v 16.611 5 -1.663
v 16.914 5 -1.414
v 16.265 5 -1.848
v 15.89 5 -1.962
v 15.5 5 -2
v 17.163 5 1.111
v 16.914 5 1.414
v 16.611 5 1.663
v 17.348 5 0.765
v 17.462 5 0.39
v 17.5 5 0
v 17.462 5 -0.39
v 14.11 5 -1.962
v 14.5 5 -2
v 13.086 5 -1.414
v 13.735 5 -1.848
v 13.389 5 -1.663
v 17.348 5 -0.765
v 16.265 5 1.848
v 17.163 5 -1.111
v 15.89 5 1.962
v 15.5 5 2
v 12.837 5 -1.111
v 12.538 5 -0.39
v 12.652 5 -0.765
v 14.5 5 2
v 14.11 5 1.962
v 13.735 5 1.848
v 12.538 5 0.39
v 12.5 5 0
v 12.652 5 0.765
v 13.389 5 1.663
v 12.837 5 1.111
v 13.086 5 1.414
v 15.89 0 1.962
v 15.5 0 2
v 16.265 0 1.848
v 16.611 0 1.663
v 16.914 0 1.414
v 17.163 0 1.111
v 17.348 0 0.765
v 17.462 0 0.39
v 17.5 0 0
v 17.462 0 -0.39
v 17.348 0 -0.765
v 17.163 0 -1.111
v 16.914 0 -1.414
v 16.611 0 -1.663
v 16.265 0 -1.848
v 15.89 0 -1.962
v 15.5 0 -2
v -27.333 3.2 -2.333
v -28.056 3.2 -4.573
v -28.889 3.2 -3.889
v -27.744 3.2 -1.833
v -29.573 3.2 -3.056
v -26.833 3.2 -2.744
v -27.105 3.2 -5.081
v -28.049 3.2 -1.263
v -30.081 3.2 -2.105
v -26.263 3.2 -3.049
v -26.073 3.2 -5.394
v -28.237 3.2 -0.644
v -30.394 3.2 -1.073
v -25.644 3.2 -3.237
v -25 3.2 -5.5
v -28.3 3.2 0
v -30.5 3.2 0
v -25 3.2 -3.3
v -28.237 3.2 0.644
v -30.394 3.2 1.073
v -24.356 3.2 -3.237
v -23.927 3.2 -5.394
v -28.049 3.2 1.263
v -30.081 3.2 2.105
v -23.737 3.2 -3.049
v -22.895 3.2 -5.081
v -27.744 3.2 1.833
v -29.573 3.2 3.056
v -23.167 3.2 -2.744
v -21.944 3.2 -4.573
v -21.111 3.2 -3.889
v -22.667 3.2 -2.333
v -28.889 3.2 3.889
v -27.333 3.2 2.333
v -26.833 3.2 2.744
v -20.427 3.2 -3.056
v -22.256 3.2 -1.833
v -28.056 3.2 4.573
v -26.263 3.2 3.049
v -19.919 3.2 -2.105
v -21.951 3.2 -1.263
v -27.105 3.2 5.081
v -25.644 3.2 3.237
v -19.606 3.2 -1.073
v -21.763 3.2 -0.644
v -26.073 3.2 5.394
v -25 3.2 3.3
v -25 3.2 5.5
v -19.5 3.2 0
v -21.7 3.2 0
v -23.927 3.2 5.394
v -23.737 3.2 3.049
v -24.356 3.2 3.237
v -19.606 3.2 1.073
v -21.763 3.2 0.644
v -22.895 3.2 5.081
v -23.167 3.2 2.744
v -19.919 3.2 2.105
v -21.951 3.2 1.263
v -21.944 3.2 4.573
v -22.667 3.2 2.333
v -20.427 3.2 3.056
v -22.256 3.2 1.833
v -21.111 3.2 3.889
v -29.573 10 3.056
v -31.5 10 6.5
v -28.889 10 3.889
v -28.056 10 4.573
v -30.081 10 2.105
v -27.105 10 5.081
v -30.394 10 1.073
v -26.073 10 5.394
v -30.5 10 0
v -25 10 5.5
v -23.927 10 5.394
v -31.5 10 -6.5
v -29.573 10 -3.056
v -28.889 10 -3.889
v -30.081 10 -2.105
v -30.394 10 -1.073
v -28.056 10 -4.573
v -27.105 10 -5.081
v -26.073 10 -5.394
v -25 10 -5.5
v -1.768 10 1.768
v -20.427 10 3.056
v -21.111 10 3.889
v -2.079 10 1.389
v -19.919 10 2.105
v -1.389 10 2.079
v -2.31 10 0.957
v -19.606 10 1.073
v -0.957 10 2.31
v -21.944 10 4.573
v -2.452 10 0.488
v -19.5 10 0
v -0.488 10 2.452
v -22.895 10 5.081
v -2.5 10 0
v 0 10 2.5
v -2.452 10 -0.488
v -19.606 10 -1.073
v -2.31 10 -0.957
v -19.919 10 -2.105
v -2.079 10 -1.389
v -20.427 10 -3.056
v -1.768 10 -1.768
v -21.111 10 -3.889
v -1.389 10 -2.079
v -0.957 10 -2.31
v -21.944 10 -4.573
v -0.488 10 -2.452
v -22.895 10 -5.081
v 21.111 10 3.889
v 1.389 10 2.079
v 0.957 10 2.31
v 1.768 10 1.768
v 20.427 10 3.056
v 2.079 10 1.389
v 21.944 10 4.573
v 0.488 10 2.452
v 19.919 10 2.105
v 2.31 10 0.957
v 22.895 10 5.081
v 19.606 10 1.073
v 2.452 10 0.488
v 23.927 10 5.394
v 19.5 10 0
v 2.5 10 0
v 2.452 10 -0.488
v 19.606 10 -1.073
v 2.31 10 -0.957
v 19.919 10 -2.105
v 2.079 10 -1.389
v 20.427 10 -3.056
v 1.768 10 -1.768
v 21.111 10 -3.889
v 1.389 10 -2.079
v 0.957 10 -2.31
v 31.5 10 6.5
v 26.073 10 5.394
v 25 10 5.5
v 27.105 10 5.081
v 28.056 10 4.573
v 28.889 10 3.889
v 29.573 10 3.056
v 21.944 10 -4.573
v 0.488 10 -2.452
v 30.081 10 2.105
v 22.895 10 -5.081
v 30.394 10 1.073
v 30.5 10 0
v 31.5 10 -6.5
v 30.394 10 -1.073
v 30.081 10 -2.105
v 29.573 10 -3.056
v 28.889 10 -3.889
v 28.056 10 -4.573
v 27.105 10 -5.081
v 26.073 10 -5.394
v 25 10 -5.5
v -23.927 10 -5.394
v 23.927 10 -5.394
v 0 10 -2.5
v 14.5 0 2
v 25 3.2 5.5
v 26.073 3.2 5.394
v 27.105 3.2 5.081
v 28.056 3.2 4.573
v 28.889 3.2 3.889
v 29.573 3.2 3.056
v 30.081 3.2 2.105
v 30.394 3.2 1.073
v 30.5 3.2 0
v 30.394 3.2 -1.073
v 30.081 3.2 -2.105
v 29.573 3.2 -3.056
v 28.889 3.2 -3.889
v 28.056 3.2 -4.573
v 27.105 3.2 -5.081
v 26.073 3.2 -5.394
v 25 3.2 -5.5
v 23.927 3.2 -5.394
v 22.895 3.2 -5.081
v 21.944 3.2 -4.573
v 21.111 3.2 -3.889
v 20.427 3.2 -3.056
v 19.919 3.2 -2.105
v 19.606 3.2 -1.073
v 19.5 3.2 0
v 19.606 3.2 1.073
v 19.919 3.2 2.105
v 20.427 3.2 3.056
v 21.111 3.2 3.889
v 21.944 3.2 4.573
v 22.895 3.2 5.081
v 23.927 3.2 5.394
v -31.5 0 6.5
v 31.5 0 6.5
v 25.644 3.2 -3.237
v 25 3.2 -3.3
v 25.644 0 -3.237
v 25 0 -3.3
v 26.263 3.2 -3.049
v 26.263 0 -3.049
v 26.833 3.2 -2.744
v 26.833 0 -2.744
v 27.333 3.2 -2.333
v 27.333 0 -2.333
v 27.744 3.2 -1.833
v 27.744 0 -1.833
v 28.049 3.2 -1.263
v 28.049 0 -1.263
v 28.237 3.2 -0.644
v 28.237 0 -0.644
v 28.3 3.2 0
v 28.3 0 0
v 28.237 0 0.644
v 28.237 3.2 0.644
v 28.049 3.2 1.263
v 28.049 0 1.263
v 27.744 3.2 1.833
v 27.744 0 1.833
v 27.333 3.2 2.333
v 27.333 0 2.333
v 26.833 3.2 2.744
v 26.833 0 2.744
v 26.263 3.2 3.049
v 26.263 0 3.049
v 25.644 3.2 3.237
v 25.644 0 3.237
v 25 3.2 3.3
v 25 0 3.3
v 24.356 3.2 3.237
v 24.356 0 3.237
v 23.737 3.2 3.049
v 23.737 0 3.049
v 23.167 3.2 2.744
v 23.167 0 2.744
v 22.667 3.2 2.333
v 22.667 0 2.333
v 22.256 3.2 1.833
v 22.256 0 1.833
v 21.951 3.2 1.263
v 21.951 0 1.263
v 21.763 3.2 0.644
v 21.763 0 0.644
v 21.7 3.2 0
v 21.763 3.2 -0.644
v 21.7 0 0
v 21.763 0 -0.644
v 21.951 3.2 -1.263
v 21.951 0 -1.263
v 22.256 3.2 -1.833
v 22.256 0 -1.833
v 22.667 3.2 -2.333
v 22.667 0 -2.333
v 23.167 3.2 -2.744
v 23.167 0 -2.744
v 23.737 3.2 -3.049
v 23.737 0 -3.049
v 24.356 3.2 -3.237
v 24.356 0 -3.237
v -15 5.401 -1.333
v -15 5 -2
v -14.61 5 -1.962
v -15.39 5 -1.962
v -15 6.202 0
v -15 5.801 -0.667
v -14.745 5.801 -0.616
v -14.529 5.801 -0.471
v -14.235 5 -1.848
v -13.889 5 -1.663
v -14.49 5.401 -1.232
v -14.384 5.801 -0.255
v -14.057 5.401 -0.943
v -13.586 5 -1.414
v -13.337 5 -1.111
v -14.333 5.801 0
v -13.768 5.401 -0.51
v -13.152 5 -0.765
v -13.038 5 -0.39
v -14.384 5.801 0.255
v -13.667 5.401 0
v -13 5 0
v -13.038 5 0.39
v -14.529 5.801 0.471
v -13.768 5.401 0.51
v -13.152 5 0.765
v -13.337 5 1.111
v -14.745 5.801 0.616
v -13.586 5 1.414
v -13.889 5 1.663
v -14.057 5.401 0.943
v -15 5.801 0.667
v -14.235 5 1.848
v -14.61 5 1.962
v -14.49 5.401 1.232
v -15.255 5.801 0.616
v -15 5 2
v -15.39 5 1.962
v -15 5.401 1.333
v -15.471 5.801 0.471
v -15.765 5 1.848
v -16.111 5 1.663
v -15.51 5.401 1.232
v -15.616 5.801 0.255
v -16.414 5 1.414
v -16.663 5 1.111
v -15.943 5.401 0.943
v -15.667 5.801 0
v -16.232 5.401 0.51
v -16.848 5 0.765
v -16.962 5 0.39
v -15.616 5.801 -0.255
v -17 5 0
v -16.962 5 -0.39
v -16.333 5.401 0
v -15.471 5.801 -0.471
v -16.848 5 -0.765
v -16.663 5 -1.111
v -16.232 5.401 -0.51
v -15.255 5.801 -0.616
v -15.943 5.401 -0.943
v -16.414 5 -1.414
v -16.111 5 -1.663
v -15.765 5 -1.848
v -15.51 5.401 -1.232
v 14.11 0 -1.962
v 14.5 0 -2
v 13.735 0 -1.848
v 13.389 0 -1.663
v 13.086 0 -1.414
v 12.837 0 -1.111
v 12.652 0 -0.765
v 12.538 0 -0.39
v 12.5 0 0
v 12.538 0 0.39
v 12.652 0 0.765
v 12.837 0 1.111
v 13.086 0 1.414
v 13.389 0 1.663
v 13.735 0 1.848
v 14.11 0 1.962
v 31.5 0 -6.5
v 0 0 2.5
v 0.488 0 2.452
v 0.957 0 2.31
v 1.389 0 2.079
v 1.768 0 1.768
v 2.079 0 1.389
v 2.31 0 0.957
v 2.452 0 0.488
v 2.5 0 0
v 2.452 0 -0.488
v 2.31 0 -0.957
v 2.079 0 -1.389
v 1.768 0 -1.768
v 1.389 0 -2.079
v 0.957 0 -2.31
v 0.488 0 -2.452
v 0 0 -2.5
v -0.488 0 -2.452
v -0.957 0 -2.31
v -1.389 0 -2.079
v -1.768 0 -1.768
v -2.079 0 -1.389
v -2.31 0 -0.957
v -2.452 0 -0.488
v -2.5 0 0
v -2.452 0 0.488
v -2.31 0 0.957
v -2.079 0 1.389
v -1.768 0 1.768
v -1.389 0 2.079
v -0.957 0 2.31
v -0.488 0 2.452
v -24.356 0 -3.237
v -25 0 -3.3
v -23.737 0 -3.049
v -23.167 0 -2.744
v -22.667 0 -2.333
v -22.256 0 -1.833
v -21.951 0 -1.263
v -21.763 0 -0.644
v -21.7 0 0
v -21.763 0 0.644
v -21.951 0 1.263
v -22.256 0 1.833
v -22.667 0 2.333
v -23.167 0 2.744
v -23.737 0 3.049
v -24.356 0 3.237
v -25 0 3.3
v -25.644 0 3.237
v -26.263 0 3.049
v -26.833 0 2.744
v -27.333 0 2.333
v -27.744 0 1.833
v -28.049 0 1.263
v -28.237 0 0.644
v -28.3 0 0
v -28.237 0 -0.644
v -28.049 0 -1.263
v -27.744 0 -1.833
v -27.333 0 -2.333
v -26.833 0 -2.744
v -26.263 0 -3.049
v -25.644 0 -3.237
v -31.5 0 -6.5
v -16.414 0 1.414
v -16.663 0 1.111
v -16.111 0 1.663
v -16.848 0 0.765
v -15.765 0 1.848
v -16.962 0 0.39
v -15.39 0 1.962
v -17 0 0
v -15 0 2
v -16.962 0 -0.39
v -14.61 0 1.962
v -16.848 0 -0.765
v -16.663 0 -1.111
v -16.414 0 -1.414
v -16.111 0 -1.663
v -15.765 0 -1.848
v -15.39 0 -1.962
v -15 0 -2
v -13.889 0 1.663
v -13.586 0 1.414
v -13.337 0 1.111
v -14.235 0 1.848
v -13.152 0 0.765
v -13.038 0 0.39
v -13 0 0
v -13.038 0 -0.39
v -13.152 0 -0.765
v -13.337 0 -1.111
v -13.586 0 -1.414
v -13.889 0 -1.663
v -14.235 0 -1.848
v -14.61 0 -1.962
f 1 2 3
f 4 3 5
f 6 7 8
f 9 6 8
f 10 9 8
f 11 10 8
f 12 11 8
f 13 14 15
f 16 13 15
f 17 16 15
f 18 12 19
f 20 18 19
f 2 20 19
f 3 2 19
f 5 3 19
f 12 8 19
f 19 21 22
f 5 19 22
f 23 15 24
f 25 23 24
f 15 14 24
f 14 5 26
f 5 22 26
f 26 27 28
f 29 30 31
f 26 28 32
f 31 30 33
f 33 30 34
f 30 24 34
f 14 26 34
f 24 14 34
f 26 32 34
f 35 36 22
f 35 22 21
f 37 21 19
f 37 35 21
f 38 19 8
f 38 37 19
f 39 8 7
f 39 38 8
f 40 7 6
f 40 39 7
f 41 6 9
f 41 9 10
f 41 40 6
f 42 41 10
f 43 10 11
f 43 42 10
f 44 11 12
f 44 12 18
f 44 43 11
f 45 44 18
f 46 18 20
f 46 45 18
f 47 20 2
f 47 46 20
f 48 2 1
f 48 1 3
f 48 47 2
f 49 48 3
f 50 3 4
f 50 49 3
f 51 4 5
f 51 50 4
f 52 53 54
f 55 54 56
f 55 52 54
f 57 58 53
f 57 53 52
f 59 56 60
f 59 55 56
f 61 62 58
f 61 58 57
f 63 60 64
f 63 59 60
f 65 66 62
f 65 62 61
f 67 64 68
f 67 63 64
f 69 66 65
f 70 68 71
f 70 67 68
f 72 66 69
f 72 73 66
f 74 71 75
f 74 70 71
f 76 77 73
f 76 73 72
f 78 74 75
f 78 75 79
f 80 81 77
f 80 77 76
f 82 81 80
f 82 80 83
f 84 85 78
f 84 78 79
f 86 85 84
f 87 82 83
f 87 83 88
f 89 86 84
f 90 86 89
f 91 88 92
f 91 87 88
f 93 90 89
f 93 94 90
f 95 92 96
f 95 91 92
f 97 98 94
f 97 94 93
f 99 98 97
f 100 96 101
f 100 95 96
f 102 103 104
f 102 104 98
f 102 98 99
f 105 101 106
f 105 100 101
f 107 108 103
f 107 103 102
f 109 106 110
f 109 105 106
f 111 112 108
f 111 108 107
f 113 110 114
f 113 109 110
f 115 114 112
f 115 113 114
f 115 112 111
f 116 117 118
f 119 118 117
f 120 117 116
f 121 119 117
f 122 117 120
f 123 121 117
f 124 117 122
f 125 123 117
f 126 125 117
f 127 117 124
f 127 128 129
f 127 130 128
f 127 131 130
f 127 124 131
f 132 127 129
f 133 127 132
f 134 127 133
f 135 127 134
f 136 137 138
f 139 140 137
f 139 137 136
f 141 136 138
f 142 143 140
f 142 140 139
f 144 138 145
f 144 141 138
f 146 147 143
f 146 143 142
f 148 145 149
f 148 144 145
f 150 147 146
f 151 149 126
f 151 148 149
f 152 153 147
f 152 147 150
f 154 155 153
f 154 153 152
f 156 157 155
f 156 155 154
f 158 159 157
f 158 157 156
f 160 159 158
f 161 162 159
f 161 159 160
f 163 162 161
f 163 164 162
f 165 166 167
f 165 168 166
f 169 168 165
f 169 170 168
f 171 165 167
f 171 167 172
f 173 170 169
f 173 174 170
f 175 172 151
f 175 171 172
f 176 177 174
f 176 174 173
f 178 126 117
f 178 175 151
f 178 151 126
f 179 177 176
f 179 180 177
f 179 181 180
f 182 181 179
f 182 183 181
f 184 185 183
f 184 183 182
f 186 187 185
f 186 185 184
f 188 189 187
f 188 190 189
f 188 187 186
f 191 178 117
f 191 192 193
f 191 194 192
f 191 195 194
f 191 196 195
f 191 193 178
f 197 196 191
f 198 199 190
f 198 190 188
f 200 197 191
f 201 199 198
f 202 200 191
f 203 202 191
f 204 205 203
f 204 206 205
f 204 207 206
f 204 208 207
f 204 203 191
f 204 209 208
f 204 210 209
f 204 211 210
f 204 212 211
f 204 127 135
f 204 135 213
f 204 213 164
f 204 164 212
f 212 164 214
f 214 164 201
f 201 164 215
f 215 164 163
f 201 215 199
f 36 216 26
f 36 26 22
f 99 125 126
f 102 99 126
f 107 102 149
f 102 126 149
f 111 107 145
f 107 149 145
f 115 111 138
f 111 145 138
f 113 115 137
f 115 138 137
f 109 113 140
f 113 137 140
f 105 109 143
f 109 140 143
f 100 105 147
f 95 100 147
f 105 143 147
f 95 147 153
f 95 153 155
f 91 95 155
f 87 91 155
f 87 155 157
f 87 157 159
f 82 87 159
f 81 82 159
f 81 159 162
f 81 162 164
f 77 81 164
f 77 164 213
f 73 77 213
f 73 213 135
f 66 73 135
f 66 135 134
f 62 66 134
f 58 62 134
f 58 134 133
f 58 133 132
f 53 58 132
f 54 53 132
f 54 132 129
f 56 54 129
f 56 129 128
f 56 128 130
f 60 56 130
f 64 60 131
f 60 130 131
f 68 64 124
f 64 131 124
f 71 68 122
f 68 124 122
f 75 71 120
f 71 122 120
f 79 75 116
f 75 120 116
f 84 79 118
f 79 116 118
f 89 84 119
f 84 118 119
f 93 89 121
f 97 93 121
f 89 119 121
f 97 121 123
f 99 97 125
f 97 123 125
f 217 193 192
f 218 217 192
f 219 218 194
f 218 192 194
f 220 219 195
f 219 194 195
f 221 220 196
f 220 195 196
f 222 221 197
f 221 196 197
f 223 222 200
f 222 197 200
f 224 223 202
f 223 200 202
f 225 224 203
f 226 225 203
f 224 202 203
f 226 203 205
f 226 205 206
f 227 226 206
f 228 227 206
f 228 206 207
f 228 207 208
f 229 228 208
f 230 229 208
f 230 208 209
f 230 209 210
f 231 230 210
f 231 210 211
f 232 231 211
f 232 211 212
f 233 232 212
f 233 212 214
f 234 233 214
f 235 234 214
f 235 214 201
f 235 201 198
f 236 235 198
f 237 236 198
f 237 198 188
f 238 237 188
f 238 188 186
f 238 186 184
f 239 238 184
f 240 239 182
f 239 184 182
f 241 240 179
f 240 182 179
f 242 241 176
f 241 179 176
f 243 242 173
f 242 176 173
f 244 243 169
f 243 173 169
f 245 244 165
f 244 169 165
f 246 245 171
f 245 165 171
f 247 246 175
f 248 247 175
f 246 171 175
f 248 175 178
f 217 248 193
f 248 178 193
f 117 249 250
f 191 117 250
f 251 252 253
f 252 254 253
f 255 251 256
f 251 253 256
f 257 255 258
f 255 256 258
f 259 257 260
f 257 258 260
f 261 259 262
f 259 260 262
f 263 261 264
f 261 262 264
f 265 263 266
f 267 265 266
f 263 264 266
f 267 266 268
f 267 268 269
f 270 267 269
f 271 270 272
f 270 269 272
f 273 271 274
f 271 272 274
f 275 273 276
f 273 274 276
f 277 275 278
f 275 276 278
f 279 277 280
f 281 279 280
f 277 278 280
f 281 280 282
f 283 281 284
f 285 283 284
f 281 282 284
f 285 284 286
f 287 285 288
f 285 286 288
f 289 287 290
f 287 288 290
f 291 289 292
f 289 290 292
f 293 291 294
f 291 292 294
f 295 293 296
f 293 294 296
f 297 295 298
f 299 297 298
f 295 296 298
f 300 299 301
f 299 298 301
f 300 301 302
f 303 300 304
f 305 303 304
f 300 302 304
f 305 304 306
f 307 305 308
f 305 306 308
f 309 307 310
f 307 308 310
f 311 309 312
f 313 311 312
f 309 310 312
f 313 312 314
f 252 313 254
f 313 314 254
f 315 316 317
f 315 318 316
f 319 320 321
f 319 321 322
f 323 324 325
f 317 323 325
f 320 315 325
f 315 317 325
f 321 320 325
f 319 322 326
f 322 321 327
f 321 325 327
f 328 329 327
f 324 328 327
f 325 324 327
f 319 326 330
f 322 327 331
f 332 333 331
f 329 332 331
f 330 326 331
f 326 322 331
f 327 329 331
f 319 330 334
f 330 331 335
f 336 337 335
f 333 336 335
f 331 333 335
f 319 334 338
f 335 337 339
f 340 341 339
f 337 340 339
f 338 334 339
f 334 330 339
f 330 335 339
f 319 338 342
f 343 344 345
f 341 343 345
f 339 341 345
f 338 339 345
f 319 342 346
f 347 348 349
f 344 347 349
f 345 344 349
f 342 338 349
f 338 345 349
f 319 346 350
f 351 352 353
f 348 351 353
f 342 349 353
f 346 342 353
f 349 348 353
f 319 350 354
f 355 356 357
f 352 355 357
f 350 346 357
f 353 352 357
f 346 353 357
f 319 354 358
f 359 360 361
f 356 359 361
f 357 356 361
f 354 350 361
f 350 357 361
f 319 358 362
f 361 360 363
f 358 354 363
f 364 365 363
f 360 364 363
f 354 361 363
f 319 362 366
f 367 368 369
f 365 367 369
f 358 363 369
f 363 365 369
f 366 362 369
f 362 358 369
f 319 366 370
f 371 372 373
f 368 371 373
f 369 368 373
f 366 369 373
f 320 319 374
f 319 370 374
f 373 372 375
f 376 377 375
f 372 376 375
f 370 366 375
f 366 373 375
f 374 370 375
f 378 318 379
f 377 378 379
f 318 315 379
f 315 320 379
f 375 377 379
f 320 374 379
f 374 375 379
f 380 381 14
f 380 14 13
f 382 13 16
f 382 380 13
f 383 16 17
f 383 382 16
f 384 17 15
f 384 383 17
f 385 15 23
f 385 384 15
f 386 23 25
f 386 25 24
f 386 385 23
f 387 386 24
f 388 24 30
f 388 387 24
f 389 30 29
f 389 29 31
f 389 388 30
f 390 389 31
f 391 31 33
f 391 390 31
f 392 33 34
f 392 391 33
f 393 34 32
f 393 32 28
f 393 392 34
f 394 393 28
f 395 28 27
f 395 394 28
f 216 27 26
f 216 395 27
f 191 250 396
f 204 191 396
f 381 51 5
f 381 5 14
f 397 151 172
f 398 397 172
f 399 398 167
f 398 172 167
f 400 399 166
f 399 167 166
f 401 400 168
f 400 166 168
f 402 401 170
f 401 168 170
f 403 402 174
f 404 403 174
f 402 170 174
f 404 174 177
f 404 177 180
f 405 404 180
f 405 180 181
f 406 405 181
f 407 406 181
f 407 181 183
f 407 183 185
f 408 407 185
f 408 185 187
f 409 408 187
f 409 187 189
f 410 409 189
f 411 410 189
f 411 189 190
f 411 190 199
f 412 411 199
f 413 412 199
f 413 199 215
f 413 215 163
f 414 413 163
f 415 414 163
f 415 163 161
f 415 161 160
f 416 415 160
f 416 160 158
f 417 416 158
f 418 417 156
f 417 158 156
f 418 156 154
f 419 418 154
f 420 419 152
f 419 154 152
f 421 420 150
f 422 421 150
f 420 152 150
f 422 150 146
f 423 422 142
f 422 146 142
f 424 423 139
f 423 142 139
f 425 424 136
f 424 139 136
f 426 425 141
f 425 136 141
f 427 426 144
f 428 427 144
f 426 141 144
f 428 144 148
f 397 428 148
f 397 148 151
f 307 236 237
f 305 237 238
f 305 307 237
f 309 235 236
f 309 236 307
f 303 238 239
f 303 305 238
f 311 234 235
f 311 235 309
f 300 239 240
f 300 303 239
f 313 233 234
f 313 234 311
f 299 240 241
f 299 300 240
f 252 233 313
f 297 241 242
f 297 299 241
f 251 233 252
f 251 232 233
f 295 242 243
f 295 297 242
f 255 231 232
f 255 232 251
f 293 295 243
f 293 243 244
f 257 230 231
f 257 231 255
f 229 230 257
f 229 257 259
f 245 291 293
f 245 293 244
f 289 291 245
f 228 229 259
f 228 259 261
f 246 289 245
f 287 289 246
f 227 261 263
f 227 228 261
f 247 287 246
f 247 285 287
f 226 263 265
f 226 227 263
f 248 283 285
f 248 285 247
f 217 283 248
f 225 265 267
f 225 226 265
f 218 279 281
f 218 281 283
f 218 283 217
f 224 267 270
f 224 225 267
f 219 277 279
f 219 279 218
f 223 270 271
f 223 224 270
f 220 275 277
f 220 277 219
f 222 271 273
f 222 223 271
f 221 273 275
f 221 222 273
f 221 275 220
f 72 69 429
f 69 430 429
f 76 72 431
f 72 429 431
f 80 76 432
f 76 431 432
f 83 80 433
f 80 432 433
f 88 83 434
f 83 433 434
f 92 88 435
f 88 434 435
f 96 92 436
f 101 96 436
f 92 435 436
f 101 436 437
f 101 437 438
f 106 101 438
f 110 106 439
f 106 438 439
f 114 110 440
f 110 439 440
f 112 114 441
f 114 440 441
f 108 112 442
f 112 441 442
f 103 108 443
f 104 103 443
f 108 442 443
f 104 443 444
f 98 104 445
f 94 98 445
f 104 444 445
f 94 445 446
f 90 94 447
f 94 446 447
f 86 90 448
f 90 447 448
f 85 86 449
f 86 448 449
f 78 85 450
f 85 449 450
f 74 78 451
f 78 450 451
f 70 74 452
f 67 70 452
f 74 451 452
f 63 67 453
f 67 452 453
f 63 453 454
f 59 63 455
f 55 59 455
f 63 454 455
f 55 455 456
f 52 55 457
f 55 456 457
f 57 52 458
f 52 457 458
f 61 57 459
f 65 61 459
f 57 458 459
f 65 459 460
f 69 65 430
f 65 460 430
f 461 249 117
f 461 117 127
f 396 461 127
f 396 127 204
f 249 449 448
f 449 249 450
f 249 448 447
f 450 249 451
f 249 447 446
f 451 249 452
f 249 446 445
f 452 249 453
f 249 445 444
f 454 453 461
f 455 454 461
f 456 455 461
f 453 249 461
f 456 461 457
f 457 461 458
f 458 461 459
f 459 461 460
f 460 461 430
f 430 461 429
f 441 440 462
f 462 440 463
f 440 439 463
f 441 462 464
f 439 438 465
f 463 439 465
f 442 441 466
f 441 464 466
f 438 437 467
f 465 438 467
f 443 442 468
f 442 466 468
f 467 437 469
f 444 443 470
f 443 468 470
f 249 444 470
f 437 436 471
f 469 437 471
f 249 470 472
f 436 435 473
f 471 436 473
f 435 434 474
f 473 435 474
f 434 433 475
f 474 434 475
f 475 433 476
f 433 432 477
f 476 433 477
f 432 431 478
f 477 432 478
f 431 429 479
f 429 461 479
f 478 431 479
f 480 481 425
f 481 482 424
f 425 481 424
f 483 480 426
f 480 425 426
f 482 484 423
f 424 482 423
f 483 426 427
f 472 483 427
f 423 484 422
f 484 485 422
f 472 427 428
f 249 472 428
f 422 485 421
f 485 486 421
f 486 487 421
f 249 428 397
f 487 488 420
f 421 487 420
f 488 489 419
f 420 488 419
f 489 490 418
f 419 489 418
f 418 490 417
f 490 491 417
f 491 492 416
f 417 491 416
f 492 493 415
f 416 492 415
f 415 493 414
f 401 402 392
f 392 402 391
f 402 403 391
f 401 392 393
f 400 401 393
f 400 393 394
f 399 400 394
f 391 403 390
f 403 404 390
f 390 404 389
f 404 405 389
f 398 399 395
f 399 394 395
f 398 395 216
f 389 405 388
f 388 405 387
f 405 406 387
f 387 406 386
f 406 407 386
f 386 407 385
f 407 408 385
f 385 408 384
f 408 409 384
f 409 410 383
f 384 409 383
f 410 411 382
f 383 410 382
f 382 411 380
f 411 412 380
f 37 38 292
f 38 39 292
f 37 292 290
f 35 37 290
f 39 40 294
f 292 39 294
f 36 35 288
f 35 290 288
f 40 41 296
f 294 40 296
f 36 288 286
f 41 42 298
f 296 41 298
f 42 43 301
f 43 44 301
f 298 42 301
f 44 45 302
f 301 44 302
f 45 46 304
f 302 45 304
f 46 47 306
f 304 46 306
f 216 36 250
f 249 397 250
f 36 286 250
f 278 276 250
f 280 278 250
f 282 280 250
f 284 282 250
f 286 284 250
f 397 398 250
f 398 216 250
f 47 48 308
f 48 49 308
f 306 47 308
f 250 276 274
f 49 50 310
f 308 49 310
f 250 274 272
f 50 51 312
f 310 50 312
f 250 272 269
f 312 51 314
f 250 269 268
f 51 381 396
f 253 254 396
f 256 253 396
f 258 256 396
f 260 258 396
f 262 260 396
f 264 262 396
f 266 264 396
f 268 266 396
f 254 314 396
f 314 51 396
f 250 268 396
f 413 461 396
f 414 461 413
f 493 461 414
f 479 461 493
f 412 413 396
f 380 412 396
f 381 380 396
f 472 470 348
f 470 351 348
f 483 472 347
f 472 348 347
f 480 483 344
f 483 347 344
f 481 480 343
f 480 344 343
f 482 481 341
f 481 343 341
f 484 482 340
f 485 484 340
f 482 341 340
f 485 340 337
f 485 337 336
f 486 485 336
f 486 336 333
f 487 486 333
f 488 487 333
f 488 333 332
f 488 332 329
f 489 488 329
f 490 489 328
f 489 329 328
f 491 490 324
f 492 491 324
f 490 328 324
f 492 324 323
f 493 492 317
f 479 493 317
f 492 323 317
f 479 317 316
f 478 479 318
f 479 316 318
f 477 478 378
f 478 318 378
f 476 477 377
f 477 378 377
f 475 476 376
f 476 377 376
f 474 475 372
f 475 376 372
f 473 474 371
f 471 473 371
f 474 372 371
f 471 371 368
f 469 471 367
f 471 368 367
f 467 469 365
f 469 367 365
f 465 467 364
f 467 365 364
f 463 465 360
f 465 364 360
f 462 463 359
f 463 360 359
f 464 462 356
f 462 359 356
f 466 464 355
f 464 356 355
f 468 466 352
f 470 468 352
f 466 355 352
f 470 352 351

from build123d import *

# Parameters (mm, degrees)
SKETCH_1_W                = 63
SKETCH_1_H                = 13
EXTRUDE_1_DEPTH           = 10
HOLE_WIZARD_1_D           = 6.6
HOLE_WIZARD_1_CBORE_D     = 11
HOLE_WIZARD_1_CBORE_DEPTH = 6.8
MM_1_D                    = 4
MM_1_DEPTH                = 5
MM_1_TIP                  = 1.201721238
CUT_EXTRUDE_1_DEPTH       = 5
HOLE_WIZARD_M6_1_D        = 5


with BuildPart() as part:
    # 草图1 → 凸台-拉伸1 (new body)
    with BuildSketch(Plane(origin=(0, 0, 0), x_dir=(1, 0, 0), z_dir=(0, 1, 0))):
        Rectangle(SKETCH_1_W, SKETCH_1_H)
    extrude(amount=EXTRUDE_1_DEPTH)

    # 打孔尺寸(%根据)内六角圆柱头螺钉的类型1 (through all)
    with Locations(Plane(origin=(-25, 10, 0), x_dir=(0, 0, 1), z_dir=(0, 1, 0))):
        with Locations((0, 0), (0, 50)):
            CounterBoreHole(HOLE_WIZARD_1_D / 2, HOLE_WIZARD_1_CBORE_D / 2, HOLE_WIZARD_1_CBORE_DEPTH)

    # 大小mm 暗销孔1
    with Locations(Plane(origin=(-15, 0, 0), x_dir=(0, 0, -1), z_dir=(0, -1, 0))):
        with Locations((0, 0)):
            Hole(MM_1_D / 2, depth=MM_1_DEPTH)
            with Locations((0, 0, -(MM_1_DEPTH + MM_1_TIP / 2))):  # 118° drill point
                Cone(0, MM_1_D / 2, MM_1_TIP, mode=Mode.SUBTRACT)

    # 草图6 → 切除-拉伸1 (cut)
    with BuildSketch(Plane.XZ):
        with BuildLine():
            Line((14.5, 2), (15.5, 2))
            ThreePointArc((15.5, 2), (17.5, 0), (15.5, -2))
            Line((15.5, -2), (14.5, -2))
            ThreePointArc((14.5, -2), (12.5, 0), (14.5, 2))
        make_face()
    extrude(amount=-CUT_EXTRUDE_1_DEPTH, mode=Mode.SUBTRACT)

    # M6 螺纹孔1 (through all)
    with Locations(Plane(origin=(0, 0, 0), x_dir=(0, 0, -1), z_dir=(0, -1, 0))):
        with Locations((0, 0)):
            Hole(HOLE_WIZARD_M6_1_D / 2)


solid = part.part
